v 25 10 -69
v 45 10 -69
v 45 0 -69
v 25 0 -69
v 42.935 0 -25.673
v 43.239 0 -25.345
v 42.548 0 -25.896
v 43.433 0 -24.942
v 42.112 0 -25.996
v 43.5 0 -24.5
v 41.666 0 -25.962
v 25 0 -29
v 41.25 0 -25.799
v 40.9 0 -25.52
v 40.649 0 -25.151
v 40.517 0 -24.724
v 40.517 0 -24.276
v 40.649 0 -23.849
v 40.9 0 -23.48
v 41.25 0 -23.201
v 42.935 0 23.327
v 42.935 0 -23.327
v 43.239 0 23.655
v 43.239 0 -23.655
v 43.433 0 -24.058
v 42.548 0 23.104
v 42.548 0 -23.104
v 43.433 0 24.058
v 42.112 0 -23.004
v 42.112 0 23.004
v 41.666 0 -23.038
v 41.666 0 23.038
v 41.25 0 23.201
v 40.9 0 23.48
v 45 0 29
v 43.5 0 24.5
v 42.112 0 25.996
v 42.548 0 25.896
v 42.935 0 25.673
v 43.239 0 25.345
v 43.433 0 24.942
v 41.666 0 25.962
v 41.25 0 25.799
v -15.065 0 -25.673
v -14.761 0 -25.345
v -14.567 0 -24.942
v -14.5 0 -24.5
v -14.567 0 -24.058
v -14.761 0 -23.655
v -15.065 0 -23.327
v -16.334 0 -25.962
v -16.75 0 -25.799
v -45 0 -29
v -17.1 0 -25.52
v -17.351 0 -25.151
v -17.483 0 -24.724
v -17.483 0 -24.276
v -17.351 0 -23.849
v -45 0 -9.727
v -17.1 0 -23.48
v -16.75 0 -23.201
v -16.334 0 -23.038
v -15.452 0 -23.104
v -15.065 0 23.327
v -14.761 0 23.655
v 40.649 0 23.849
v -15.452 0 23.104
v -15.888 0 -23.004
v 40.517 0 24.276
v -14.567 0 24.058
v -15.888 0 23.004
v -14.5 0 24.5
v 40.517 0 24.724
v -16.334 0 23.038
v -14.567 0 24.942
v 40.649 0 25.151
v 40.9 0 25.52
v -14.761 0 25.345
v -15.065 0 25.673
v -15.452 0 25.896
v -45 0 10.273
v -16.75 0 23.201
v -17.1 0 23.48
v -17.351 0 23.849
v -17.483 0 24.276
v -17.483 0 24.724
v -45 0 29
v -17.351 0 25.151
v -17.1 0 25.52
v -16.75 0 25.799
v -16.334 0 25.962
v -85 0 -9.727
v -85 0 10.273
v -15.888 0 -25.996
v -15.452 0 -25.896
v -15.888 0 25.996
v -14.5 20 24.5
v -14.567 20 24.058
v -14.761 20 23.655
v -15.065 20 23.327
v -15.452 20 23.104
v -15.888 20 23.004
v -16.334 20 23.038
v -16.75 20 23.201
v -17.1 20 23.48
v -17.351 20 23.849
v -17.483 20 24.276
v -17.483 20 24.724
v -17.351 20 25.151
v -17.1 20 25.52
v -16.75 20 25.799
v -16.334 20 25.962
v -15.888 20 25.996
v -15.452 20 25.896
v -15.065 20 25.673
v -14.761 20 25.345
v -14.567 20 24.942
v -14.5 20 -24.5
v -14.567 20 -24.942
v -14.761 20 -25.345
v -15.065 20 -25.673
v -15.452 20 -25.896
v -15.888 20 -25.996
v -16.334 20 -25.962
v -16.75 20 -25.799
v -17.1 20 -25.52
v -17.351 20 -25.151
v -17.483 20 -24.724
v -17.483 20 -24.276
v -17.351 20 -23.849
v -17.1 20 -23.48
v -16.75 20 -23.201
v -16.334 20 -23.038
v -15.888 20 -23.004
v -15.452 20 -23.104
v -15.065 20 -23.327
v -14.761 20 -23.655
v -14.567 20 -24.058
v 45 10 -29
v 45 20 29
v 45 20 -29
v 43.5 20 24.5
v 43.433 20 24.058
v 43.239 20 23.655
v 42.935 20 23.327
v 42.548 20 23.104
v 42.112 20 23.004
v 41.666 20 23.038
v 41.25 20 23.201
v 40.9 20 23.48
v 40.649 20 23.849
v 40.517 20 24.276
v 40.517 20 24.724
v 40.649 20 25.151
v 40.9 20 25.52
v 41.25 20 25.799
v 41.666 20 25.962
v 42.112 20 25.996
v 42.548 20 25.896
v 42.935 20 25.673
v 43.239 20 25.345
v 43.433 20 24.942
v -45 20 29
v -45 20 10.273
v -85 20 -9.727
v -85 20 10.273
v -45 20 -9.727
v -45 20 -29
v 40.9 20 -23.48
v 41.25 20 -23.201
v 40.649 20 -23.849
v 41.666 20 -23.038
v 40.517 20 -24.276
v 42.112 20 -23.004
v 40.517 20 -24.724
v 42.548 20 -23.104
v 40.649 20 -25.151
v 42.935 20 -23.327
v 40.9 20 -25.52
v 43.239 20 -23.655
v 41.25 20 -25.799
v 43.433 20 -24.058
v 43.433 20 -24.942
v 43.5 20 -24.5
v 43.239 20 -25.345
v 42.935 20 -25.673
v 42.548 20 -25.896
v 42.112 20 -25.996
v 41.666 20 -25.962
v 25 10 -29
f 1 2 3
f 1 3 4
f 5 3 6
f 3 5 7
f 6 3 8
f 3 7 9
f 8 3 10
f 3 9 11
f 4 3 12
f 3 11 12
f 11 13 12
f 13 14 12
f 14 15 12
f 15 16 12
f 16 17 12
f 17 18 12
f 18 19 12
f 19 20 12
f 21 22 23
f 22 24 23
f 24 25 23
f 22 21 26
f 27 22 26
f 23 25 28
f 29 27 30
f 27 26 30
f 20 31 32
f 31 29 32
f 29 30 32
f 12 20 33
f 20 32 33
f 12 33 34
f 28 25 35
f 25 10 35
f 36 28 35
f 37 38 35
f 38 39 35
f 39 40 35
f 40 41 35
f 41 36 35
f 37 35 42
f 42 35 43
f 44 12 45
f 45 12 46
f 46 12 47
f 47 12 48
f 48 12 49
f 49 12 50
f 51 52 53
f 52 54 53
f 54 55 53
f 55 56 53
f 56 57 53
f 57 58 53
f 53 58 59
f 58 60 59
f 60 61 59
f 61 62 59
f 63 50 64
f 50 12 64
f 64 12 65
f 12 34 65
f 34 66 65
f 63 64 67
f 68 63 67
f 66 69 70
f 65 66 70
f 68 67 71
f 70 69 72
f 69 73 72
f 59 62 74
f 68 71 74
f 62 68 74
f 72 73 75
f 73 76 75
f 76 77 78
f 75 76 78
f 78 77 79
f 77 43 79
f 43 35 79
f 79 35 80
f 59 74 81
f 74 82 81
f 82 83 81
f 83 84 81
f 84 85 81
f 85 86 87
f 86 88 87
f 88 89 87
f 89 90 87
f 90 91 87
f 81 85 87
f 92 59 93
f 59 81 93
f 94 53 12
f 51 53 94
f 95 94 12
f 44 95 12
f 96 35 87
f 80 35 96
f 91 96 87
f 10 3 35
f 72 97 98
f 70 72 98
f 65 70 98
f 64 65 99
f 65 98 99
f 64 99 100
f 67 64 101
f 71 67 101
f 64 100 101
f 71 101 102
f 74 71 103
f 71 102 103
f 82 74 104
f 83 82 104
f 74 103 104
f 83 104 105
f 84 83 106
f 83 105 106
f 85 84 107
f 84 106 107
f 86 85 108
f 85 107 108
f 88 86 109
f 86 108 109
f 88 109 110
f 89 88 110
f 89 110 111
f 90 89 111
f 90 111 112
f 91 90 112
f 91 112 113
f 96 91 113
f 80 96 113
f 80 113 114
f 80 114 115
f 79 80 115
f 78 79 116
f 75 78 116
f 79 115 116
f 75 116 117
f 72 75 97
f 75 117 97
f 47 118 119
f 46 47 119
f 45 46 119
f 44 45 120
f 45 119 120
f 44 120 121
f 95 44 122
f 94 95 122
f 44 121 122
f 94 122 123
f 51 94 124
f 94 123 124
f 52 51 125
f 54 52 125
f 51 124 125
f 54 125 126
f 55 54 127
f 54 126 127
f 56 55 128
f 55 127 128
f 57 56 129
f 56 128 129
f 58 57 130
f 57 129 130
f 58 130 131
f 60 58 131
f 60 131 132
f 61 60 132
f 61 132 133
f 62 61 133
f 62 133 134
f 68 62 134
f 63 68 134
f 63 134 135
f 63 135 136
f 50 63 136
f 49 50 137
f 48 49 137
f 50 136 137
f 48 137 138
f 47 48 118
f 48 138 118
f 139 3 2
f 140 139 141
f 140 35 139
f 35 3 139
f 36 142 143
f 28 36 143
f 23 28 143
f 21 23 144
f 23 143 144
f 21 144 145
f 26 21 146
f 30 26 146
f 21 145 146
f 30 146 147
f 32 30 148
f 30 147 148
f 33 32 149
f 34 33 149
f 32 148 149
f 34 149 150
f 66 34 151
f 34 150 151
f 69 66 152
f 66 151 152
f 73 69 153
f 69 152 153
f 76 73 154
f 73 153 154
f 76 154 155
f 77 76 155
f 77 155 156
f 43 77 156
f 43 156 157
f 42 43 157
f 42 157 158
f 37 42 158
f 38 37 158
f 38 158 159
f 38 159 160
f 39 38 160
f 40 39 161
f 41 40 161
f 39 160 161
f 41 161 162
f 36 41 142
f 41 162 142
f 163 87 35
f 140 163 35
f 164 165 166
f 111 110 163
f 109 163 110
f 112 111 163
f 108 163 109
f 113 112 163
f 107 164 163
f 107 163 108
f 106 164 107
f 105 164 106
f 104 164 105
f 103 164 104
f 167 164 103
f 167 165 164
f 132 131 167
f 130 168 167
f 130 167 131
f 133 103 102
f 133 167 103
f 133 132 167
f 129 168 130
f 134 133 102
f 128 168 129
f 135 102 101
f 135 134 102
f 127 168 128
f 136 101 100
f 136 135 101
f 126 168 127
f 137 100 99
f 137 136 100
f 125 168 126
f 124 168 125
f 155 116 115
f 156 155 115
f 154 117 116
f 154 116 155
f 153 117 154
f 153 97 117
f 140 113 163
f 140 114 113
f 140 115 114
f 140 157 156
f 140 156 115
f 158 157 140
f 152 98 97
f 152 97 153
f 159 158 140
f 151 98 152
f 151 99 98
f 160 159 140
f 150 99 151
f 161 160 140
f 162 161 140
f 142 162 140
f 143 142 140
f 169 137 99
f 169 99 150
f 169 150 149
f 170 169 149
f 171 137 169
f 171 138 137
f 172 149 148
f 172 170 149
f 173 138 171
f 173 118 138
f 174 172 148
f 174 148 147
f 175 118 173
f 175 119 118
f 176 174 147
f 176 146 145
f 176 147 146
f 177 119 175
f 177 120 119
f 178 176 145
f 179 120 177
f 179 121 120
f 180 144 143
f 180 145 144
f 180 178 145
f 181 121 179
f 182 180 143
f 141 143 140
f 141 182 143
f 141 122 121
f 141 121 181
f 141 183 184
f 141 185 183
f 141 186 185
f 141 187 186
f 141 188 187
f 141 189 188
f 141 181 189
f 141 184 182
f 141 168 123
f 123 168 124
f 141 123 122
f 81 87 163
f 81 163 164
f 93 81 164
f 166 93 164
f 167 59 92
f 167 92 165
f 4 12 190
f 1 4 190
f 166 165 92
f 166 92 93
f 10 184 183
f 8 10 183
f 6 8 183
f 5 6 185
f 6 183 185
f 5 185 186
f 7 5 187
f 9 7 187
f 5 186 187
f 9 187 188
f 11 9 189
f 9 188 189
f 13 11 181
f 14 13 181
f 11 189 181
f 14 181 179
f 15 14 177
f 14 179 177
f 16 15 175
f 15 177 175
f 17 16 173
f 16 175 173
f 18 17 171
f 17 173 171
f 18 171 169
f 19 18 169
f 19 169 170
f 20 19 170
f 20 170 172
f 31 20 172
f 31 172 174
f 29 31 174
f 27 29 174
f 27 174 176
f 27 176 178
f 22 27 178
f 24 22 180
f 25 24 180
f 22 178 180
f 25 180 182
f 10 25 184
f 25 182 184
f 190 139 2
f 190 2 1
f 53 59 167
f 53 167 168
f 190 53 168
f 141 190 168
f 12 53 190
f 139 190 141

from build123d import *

# Parameters (mm, degrees)
SKETCH1_W           = 90
SKETCH1_H           = 58
BOSS_EXTRUDE1_DEPTH = 20
SKETCH2_R           = 1.5
CUT_EXTRUDE1_DEPTH  = 20
SKETCH3_W           = 20
SKETCH3_H           = 10
BOSS_EXTRUDE2_DEPTH = 40
SKETCH4_W           = 20
SKETCH4_H           = 20
BOSS_EXTRUDE3_DEPTH = 40


with BuildPart() as part:
    # Sketch1 → Boss-Extrude1 (new body)
    with BuildSketch(Plane(origin=(0, 0, 0), x_dir=(1, 0, 0), z_dir=(0, 1, 0))):
        Rectangle(SKETCH1_W, SKETCH1_H)
    extrude(amount=BOSS_EXTRUDE1_DEPTH)

    # Sketch2 → Cut-Extrude1 (cut)
    with BuildSketch(Plane(origin=(0, 20, 0), x_dir=(1, 0, 0), z_dir=(0, 1, 0))):
        with Locations((42, 24.5)):
            Circle(SKETCH2_R)
        with Locations((42, -24.5)):
            Circle(SKETCH2_R)
        with Locations((-16, 24.5)):
            Circle(SKETCH2_R)
        with Locations((-16, -24.5)):
            Circle(SKETCH2_R)
    extrude(amount=-CUT_EXTRUDE1_DEPTH, mode=Mode.SUBTRACT)

    # Sketch3 → Boss-Extrude2 (add)
    with BuildSketch(Plane(origin=(0, 0, -29), x_dir=(-1, 0, 0), z_dir=(0, 0, -1))):
        with Locations((-35, 5)):
            Rectangle(SKETCH3_W, SKETCH3_H)
    extrude(amount=BOSS_EXTRUDE2_DEPTH)

    # Sketch4 → Boss-Extrude3 (add)
    with BuildSketch(Plane.ZY.offset(45)):
        with Locations((0.272543659, 10)):
            Rectangle(SKETCH4_W, SKETCH4_H)
    extrude(amount=BOSS_EXTRUDE3_DEPTH)


solid = part.part
